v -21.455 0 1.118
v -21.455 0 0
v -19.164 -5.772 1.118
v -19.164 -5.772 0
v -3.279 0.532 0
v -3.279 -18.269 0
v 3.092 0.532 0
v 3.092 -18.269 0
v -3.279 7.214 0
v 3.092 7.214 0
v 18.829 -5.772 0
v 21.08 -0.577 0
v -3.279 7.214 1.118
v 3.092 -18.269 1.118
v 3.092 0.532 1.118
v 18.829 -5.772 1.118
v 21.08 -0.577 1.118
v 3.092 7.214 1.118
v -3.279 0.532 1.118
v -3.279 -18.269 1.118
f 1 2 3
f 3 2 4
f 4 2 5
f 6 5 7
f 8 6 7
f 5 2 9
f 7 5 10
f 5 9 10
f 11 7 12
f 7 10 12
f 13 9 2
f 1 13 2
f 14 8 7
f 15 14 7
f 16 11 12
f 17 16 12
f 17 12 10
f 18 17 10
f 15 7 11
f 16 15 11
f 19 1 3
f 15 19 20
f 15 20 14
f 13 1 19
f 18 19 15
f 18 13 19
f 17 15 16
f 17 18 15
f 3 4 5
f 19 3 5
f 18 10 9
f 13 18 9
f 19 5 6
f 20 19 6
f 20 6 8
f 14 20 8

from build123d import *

# Parameters (mm, degrees)
F1_DEPTH = 1.1176


with BuildPart() as f1:
    # F0 (on Top) → F1 (new body)
    with BuildSketch(Plane.XY):
        Polygon((-3.279098, 0.532189), (-3.279098, 7.214016), (-21.454671, 0), (-19.16354, -5.77246), align=None)
        Polygon((3.091722, 7.214016), (-3.279098, 7.214016), (-3.279098, 0.532189), (-3.279098, -18.269263), (3.091722, -18.269263), (3.091722, 0.532189), align=None)
        Polygon((21.079501, -0.577142), (3.091722, 7.214016), (3.091722, 0.532189), (18.829221, -5.77246), align=None)
    extrude(amount=F1_DEPTH)


solid = f1.part
